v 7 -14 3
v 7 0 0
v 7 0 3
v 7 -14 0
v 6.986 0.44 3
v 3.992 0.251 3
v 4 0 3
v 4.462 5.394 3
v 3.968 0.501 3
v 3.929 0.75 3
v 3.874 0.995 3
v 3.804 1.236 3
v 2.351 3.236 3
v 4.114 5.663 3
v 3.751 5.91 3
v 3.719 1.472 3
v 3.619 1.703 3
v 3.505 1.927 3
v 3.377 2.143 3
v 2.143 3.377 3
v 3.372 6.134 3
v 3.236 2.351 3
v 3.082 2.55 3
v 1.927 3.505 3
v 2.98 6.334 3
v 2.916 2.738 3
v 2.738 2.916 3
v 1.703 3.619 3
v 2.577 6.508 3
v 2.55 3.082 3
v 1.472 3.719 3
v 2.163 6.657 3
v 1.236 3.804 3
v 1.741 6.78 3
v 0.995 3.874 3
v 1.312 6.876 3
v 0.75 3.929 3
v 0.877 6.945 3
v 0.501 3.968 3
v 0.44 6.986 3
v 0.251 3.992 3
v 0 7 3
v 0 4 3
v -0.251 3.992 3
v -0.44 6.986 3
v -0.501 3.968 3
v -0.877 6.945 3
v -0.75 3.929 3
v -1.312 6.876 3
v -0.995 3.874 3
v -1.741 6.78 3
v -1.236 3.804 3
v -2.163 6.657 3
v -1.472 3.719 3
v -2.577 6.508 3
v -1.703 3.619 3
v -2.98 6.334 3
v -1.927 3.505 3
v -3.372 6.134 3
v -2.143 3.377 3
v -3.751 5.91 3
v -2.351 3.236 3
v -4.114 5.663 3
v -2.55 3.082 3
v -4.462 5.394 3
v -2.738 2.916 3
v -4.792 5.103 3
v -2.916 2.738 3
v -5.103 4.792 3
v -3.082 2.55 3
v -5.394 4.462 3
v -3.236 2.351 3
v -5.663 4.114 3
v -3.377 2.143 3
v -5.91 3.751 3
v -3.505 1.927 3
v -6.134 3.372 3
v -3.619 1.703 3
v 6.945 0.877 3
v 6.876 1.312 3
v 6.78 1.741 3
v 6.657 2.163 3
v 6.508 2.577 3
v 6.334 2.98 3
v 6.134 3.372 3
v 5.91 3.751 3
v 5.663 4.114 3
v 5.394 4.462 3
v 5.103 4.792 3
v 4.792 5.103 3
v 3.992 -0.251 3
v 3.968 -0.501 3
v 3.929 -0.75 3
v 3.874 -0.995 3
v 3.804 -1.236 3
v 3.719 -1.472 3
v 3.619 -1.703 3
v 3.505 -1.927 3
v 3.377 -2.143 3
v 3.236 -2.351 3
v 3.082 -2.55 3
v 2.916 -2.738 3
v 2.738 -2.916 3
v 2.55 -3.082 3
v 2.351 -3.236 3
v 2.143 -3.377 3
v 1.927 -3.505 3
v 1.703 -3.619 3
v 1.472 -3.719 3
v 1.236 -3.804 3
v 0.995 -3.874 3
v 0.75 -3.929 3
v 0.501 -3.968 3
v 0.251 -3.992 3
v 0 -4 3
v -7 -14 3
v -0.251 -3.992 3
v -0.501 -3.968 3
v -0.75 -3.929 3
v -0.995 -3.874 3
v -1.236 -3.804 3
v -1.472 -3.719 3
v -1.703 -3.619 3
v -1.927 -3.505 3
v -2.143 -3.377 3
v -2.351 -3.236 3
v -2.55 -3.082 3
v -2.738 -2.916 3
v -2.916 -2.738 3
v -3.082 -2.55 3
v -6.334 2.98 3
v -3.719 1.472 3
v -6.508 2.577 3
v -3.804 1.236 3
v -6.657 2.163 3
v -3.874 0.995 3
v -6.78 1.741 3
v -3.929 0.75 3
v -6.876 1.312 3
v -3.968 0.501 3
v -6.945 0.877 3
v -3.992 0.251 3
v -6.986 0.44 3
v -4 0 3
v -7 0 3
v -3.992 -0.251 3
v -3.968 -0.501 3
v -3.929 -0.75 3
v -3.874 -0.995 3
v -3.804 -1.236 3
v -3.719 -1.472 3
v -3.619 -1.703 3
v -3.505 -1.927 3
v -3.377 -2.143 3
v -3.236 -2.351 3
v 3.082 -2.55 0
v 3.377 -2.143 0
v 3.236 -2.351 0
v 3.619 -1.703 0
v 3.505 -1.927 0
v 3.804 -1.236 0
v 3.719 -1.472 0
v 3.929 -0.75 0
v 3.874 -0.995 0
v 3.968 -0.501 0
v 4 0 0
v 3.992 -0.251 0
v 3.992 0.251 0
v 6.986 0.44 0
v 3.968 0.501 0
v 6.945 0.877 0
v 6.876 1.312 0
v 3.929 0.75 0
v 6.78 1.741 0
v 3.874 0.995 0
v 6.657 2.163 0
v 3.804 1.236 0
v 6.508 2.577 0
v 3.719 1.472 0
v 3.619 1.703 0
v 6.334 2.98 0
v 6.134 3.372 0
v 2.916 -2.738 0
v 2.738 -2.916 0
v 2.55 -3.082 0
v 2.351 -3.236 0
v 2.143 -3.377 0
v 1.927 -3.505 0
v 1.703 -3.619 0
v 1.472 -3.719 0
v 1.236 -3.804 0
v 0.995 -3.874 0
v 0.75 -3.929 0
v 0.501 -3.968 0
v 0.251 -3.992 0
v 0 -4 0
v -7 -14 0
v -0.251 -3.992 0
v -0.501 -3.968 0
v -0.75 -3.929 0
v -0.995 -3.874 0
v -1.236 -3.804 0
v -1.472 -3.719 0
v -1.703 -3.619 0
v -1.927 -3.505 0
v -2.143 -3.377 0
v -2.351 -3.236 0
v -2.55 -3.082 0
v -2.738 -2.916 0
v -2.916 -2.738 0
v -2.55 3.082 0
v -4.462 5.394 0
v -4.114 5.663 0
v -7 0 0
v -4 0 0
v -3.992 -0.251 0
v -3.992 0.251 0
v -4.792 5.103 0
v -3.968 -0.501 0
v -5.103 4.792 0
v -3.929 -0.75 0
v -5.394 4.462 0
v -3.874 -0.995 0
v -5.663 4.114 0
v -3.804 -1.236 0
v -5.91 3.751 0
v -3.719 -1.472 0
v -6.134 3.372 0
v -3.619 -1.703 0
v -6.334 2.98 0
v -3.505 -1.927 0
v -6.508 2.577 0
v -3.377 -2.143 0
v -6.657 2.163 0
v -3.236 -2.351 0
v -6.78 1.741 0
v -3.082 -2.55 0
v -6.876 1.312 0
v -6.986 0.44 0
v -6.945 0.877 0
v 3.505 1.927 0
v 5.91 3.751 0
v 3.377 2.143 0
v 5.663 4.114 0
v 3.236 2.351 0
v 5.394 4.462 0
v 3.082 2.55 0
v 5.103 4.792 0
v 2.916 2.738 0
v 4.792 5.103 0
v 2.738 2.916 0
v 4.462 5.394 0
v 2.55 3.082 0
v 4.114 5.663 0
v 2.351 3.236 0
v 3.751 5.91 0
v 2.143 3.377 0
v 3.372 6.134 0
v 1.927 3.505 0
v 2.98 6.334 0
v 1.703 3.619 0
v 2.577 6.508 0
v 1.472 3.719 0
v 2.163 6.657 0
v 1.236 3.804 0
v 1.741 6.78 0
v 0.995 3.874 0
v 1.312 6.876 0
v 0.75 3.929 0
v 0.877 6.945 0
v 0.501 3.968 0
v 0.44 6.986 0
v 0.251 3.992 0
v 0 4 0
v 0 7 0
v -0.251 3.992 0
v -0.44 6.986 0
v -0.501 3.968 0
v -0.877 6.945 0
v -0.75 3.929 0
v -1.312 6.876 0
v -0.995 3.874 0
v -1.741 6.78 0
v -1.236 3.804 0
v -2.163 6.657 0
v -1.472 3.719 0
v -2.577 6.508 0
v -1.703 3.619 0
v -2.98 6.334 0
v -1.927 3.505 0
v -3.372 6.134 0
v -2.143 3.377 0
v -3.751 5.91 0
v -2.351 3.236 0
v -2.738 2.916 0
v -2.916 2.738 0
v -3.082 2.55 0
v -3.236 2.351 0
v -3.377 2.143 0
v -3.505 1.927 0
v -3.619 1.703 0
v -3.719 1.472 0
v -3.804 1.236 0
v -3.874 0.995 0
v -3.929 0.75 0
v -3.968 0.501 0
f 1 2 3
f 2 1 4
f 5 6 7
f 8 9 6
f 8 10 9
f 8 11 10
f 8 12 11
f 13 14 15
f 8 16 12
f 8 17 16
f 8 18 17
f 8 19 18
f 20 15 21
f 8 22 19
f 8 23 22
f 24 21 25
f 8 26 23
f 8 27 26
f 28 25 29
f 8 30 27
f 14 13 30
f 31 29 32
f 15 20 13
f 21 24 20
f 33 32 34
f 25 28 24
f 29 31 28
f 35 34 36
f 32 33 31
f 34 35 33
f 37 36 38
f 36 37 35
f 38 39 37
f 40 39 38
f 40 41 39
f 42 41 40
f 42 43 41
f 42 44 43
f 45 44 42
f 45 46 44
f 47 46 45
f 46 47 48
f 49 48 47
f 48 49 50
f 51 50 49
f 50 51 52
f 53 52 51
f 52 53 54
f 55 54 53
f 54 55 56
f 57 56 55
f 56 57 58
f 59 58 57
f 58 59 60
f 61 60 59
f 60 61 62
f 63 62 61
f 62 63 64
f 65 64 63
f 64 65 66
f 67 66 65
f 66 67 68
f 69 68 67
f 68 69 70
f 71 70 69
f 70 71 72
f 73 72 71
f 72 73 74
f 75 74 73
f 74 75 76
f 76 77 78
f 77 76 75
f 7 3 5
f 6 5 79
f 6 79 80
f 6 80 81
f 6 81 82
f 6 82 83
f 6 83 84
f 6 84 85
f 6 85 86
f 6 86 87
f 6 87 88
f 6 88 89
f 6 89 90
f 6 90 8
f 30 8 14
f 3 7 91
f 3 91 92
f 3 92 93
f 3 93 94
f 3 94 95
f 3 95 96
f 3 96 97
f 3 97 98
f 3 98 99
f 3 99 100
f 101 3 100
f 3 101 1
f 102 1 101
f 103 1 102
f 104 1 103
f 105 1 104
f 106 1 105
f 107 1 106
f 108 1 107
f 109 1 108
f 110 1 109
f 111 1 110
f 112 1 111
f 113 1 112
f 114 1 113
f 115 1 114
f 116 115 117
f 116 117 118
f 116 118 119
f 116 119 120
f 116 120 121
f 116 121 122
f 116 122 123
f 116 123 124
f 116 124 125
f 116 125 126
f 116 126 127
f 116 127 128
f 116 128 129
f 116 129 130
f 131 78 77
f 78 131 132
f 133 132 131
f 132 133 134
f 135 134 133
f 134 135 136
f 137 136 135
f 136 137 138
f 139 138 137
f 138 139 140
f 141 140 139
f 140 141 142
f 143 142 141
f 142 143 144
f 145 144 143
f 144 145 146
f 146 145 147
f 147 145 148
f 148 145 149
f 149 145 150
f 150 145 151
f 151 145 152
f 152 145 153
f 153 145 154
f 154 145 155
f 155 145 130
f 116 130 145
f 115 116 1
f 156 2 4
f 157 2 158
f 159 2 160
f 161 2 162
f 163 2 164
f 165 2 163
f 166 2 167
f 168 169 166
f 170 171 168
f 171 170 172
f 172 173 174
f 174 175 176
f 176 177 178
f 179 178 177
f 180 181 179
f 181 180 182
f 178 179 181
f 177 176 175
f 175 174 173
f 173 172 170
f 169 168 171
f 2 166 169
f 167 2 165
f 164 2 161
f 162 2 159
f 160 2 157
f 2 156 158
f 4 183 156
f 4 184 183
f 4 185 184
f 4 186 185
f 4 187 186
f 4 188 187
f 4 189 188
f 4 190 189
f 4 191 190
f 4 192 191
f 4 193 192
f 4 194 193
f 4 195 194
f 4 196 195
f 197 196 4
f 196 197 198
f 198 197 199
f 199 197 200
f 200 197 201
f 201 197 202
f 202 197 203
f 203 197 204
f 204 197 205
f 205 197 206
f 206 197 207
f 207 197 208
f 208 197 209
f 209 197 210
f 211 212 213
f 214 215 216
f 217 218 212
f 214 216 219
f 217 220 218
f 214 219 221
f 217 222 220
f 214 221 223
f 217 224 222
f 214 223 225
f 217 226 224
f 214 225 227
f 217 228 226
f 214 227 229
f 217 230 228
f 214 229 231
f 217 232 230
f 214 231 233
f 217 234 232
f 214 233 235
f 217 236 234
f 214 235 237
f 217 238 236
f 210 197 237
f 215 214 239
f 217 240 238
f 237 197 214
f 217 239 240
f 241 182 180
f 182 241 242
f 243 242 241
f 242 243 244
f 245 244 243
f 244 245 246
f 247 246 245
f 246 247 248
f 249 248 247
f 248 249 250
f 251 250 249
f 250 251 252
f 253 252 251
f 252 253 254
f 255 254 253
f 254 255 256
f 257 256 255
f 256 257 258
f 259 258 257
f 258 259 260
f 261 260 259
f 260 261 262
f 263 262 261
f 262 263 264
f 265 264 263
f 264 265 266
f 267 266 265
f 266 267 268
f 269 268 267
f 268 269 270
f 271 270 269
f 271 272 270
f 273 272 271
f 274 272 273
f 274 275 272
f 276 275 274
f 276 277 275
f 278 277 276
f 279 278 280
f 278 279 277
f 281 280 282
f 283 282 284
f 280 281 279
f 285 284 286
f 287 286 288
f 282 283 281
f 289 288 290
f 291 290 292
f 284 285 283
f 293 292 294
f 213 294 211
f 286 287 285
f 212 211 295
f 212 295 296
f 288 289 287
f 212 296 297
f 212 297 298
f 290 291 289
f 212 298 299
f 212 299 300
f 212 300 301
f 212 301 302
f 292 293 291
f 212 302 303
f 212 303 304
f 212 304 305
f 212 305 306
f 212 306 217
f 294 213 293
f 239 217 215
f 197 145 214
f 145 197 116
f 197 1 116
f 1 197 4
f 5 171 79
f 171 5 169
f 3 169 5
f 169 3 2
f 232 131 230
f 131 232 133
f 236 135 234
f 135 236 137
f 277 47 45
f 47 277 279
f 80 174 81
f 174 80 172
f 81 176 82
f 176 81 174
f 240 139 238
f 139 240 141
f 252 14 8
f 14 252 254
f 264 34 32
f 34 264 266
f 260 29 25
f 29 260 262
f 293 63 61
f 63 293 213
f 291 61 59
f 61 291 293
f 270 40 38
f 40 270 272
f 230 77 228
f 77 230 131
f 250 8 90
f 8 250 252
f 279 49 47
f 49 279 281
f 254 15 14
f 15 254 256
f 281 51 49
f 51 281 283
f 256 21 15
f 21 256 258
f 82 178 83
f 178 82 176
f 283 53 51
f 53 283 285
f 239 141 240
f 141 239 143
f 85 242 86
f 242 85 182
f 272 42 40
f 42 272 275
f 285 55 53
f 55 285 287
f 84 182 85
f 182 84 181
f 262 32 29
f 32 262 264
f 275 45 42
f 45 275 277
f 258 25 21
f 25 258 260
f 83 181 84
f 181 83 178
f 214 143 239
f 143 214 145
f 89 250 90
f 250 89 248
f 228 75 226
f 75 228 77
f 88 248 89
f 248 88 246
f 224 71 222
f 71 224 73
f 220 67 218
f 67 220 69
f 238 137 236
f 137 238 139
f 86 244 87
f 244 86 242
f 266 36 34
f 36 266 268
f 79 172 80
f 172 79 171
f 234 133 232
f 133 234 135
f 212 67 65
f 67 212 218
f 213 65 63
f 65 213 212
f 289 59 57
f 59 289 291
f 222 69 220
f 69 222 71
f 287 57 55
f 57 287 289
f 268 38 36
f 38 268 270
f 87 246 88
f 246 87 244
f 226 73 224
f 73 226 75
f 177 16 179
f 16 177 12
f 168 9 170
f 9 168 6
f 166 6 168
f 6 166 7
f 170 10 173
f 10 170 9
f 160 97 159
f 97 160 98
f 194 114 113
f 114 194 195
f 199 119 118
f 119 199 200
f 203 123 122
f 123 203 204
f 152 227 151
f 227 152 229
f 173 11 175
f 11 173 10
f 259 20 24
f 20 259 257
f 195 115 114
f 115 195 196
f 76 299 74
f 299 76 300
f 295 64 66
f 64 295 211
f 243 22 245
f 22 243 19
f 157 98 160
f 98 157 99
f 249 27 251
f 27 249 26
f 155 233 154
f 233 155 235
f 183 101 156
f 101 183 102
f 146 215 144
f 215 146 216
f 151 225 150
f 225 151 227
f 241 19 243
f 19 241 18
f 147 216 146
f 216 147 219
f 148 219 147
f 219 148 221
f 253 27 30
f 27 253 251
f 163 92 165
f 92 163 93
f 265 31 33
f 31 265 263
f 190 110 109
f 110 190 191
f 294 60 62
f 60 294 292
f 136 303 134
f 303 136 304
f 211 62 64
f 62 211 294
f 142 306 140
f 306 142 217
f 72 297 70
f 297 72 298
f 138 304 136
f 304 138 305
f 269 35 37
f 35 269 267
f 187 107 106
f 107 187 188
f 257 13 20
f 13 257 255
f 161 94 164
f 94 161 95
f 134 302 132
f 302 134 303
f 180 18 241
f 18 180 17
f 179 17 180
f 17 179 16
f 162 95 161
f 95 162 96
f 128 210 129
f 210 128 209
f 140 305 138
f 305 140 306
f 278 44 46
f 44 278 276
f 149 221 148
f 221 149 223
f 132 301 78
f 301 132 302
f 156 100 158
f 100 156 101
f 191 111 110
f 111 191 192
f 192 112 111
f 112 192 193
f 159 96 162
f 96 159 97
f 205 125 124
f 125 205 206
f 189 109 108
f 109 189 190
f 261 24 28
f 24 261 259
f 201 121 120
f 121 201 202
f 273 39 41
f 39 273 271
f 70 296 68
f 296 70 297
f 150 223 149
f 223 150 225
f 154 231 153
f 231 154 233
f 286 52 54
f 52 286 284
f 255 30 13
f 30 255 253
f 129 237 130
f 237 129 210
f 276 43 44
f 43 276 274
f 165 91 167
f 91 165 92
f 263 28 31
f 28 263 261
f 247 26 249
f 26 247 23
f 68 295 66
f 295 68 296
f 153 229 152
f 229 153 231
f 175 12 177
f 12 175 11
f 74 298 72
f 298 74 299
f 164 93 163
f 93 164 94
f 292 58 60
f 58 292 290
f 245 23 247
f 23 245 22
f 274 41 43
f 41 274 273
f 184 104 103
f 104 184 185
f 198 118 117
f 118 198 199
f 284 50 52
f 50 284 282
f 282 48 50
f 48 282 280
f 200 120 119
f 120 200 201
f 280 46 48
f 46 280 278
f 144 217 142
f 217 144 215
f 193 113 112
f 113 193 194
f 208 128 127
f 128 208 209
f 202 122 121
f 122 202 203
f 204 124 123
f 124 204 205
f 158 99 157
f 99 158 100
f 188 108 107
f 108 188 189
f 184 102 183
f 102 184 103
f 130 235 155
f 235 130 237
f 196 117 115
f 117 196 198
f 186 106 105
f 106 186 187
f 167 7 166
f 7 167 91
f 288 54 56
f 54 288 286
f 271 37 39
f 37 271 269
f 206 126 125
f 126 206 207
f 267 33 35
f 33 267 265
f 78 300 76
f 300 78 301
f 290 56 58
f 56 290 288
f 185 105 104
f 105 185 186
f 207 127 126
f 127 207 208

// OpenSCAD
WallThickness = 3;

CutoutWidth = 10;

length = 150;
Height = 10;
Width = CutoutWidth + WallThickness;



BracketThickness = 4;
BracketScrews = 3.125;
MountScrews = 4;



Resolution = 100;




//bracket ();

difference ()
{
    
    screwBrackets ();
    //bracket ();
    //cutout ();
}

///////////////////////////////////////////
module bracket ()
{
    // top
    cube ([length, Width, Height * 2]);
    
    // bottom 
    translate([0, - Width /2, 0])
    cube ([length, Width * 2, WallThickness]);
    
    // mounting brackets
    for (i = [[ MountScrews + WallThickness, MountScrews + (WallThickness *2) + CutoutWidth, 0],
        [ length - (MountScrews + WallThickness) , MountScrews + (WallThickness *2) + CutoutWidth, 0],
        [ length /2, MountScrews - WallThickness - CutoutWidth, 0 ]]) 
    
        translate(i)
        cylinder (h = WallThickness, r = MountScrews + WallThickness , $fn = Resolution);  
}

///////////////////////////////////////////
module screwBrackets ()
{
    difference ()
    {
        union ()
        {
            translate([- (MountScrews + WallThickness) , - (MountScrews + WallThickness) * 2, , 0])
            cube ( [(MountScrews + WallThickness) * 2, (MountScrews + WallThickness) * 2, WallThickness]);     
            cylinder (h = WallThickness, r = MountScrews + WallThickness , $fn = Resolution); 
        }
        
        cylinder (h = WallThickness + 50, r = MountScrews , $fn = Resolution);
    }
}

//////////////////////////////////////////
module cutout ()
{
    // top
    translate ([0, (Width /2) -  (CutoutWidth/2) , WallThickness])
    cube ([length, CutoutWidth , Height * 2]);
    
    
    // mounting bracket holes
    for (i = [[ MountScrews + WallThickness, MountScrews + (WallThickness * 4), 0], 
        [ length - (MountScrews + WallThickness) , MountScrews + (WallThickness * 4), 0], 
        [ length /2, - CutoutWidth, 0 ]]) 

    {
        translate(i)
        cylinder (h = WallThickness, r = MountScrews , $fn = Resolution);
    }   
    
    /* Bracket Screws holes
    for ( r= [[ MountScrews + WallThickness, MountScrews + (WallThickness * 4), 0],
        [ length - (MountScrews + WallThickness), MountScrews + (WallThickness * 4), 0],
        [ length /2, - MountScrews - 2, 0 ]])
    
    {
        translate (r)
        rotate ([0, 0, 0])
        cylinder (h = (WallThickness * 2) + CutoutWidth , r = BracketScrews , $fn = Resolution);
    }*/
}
